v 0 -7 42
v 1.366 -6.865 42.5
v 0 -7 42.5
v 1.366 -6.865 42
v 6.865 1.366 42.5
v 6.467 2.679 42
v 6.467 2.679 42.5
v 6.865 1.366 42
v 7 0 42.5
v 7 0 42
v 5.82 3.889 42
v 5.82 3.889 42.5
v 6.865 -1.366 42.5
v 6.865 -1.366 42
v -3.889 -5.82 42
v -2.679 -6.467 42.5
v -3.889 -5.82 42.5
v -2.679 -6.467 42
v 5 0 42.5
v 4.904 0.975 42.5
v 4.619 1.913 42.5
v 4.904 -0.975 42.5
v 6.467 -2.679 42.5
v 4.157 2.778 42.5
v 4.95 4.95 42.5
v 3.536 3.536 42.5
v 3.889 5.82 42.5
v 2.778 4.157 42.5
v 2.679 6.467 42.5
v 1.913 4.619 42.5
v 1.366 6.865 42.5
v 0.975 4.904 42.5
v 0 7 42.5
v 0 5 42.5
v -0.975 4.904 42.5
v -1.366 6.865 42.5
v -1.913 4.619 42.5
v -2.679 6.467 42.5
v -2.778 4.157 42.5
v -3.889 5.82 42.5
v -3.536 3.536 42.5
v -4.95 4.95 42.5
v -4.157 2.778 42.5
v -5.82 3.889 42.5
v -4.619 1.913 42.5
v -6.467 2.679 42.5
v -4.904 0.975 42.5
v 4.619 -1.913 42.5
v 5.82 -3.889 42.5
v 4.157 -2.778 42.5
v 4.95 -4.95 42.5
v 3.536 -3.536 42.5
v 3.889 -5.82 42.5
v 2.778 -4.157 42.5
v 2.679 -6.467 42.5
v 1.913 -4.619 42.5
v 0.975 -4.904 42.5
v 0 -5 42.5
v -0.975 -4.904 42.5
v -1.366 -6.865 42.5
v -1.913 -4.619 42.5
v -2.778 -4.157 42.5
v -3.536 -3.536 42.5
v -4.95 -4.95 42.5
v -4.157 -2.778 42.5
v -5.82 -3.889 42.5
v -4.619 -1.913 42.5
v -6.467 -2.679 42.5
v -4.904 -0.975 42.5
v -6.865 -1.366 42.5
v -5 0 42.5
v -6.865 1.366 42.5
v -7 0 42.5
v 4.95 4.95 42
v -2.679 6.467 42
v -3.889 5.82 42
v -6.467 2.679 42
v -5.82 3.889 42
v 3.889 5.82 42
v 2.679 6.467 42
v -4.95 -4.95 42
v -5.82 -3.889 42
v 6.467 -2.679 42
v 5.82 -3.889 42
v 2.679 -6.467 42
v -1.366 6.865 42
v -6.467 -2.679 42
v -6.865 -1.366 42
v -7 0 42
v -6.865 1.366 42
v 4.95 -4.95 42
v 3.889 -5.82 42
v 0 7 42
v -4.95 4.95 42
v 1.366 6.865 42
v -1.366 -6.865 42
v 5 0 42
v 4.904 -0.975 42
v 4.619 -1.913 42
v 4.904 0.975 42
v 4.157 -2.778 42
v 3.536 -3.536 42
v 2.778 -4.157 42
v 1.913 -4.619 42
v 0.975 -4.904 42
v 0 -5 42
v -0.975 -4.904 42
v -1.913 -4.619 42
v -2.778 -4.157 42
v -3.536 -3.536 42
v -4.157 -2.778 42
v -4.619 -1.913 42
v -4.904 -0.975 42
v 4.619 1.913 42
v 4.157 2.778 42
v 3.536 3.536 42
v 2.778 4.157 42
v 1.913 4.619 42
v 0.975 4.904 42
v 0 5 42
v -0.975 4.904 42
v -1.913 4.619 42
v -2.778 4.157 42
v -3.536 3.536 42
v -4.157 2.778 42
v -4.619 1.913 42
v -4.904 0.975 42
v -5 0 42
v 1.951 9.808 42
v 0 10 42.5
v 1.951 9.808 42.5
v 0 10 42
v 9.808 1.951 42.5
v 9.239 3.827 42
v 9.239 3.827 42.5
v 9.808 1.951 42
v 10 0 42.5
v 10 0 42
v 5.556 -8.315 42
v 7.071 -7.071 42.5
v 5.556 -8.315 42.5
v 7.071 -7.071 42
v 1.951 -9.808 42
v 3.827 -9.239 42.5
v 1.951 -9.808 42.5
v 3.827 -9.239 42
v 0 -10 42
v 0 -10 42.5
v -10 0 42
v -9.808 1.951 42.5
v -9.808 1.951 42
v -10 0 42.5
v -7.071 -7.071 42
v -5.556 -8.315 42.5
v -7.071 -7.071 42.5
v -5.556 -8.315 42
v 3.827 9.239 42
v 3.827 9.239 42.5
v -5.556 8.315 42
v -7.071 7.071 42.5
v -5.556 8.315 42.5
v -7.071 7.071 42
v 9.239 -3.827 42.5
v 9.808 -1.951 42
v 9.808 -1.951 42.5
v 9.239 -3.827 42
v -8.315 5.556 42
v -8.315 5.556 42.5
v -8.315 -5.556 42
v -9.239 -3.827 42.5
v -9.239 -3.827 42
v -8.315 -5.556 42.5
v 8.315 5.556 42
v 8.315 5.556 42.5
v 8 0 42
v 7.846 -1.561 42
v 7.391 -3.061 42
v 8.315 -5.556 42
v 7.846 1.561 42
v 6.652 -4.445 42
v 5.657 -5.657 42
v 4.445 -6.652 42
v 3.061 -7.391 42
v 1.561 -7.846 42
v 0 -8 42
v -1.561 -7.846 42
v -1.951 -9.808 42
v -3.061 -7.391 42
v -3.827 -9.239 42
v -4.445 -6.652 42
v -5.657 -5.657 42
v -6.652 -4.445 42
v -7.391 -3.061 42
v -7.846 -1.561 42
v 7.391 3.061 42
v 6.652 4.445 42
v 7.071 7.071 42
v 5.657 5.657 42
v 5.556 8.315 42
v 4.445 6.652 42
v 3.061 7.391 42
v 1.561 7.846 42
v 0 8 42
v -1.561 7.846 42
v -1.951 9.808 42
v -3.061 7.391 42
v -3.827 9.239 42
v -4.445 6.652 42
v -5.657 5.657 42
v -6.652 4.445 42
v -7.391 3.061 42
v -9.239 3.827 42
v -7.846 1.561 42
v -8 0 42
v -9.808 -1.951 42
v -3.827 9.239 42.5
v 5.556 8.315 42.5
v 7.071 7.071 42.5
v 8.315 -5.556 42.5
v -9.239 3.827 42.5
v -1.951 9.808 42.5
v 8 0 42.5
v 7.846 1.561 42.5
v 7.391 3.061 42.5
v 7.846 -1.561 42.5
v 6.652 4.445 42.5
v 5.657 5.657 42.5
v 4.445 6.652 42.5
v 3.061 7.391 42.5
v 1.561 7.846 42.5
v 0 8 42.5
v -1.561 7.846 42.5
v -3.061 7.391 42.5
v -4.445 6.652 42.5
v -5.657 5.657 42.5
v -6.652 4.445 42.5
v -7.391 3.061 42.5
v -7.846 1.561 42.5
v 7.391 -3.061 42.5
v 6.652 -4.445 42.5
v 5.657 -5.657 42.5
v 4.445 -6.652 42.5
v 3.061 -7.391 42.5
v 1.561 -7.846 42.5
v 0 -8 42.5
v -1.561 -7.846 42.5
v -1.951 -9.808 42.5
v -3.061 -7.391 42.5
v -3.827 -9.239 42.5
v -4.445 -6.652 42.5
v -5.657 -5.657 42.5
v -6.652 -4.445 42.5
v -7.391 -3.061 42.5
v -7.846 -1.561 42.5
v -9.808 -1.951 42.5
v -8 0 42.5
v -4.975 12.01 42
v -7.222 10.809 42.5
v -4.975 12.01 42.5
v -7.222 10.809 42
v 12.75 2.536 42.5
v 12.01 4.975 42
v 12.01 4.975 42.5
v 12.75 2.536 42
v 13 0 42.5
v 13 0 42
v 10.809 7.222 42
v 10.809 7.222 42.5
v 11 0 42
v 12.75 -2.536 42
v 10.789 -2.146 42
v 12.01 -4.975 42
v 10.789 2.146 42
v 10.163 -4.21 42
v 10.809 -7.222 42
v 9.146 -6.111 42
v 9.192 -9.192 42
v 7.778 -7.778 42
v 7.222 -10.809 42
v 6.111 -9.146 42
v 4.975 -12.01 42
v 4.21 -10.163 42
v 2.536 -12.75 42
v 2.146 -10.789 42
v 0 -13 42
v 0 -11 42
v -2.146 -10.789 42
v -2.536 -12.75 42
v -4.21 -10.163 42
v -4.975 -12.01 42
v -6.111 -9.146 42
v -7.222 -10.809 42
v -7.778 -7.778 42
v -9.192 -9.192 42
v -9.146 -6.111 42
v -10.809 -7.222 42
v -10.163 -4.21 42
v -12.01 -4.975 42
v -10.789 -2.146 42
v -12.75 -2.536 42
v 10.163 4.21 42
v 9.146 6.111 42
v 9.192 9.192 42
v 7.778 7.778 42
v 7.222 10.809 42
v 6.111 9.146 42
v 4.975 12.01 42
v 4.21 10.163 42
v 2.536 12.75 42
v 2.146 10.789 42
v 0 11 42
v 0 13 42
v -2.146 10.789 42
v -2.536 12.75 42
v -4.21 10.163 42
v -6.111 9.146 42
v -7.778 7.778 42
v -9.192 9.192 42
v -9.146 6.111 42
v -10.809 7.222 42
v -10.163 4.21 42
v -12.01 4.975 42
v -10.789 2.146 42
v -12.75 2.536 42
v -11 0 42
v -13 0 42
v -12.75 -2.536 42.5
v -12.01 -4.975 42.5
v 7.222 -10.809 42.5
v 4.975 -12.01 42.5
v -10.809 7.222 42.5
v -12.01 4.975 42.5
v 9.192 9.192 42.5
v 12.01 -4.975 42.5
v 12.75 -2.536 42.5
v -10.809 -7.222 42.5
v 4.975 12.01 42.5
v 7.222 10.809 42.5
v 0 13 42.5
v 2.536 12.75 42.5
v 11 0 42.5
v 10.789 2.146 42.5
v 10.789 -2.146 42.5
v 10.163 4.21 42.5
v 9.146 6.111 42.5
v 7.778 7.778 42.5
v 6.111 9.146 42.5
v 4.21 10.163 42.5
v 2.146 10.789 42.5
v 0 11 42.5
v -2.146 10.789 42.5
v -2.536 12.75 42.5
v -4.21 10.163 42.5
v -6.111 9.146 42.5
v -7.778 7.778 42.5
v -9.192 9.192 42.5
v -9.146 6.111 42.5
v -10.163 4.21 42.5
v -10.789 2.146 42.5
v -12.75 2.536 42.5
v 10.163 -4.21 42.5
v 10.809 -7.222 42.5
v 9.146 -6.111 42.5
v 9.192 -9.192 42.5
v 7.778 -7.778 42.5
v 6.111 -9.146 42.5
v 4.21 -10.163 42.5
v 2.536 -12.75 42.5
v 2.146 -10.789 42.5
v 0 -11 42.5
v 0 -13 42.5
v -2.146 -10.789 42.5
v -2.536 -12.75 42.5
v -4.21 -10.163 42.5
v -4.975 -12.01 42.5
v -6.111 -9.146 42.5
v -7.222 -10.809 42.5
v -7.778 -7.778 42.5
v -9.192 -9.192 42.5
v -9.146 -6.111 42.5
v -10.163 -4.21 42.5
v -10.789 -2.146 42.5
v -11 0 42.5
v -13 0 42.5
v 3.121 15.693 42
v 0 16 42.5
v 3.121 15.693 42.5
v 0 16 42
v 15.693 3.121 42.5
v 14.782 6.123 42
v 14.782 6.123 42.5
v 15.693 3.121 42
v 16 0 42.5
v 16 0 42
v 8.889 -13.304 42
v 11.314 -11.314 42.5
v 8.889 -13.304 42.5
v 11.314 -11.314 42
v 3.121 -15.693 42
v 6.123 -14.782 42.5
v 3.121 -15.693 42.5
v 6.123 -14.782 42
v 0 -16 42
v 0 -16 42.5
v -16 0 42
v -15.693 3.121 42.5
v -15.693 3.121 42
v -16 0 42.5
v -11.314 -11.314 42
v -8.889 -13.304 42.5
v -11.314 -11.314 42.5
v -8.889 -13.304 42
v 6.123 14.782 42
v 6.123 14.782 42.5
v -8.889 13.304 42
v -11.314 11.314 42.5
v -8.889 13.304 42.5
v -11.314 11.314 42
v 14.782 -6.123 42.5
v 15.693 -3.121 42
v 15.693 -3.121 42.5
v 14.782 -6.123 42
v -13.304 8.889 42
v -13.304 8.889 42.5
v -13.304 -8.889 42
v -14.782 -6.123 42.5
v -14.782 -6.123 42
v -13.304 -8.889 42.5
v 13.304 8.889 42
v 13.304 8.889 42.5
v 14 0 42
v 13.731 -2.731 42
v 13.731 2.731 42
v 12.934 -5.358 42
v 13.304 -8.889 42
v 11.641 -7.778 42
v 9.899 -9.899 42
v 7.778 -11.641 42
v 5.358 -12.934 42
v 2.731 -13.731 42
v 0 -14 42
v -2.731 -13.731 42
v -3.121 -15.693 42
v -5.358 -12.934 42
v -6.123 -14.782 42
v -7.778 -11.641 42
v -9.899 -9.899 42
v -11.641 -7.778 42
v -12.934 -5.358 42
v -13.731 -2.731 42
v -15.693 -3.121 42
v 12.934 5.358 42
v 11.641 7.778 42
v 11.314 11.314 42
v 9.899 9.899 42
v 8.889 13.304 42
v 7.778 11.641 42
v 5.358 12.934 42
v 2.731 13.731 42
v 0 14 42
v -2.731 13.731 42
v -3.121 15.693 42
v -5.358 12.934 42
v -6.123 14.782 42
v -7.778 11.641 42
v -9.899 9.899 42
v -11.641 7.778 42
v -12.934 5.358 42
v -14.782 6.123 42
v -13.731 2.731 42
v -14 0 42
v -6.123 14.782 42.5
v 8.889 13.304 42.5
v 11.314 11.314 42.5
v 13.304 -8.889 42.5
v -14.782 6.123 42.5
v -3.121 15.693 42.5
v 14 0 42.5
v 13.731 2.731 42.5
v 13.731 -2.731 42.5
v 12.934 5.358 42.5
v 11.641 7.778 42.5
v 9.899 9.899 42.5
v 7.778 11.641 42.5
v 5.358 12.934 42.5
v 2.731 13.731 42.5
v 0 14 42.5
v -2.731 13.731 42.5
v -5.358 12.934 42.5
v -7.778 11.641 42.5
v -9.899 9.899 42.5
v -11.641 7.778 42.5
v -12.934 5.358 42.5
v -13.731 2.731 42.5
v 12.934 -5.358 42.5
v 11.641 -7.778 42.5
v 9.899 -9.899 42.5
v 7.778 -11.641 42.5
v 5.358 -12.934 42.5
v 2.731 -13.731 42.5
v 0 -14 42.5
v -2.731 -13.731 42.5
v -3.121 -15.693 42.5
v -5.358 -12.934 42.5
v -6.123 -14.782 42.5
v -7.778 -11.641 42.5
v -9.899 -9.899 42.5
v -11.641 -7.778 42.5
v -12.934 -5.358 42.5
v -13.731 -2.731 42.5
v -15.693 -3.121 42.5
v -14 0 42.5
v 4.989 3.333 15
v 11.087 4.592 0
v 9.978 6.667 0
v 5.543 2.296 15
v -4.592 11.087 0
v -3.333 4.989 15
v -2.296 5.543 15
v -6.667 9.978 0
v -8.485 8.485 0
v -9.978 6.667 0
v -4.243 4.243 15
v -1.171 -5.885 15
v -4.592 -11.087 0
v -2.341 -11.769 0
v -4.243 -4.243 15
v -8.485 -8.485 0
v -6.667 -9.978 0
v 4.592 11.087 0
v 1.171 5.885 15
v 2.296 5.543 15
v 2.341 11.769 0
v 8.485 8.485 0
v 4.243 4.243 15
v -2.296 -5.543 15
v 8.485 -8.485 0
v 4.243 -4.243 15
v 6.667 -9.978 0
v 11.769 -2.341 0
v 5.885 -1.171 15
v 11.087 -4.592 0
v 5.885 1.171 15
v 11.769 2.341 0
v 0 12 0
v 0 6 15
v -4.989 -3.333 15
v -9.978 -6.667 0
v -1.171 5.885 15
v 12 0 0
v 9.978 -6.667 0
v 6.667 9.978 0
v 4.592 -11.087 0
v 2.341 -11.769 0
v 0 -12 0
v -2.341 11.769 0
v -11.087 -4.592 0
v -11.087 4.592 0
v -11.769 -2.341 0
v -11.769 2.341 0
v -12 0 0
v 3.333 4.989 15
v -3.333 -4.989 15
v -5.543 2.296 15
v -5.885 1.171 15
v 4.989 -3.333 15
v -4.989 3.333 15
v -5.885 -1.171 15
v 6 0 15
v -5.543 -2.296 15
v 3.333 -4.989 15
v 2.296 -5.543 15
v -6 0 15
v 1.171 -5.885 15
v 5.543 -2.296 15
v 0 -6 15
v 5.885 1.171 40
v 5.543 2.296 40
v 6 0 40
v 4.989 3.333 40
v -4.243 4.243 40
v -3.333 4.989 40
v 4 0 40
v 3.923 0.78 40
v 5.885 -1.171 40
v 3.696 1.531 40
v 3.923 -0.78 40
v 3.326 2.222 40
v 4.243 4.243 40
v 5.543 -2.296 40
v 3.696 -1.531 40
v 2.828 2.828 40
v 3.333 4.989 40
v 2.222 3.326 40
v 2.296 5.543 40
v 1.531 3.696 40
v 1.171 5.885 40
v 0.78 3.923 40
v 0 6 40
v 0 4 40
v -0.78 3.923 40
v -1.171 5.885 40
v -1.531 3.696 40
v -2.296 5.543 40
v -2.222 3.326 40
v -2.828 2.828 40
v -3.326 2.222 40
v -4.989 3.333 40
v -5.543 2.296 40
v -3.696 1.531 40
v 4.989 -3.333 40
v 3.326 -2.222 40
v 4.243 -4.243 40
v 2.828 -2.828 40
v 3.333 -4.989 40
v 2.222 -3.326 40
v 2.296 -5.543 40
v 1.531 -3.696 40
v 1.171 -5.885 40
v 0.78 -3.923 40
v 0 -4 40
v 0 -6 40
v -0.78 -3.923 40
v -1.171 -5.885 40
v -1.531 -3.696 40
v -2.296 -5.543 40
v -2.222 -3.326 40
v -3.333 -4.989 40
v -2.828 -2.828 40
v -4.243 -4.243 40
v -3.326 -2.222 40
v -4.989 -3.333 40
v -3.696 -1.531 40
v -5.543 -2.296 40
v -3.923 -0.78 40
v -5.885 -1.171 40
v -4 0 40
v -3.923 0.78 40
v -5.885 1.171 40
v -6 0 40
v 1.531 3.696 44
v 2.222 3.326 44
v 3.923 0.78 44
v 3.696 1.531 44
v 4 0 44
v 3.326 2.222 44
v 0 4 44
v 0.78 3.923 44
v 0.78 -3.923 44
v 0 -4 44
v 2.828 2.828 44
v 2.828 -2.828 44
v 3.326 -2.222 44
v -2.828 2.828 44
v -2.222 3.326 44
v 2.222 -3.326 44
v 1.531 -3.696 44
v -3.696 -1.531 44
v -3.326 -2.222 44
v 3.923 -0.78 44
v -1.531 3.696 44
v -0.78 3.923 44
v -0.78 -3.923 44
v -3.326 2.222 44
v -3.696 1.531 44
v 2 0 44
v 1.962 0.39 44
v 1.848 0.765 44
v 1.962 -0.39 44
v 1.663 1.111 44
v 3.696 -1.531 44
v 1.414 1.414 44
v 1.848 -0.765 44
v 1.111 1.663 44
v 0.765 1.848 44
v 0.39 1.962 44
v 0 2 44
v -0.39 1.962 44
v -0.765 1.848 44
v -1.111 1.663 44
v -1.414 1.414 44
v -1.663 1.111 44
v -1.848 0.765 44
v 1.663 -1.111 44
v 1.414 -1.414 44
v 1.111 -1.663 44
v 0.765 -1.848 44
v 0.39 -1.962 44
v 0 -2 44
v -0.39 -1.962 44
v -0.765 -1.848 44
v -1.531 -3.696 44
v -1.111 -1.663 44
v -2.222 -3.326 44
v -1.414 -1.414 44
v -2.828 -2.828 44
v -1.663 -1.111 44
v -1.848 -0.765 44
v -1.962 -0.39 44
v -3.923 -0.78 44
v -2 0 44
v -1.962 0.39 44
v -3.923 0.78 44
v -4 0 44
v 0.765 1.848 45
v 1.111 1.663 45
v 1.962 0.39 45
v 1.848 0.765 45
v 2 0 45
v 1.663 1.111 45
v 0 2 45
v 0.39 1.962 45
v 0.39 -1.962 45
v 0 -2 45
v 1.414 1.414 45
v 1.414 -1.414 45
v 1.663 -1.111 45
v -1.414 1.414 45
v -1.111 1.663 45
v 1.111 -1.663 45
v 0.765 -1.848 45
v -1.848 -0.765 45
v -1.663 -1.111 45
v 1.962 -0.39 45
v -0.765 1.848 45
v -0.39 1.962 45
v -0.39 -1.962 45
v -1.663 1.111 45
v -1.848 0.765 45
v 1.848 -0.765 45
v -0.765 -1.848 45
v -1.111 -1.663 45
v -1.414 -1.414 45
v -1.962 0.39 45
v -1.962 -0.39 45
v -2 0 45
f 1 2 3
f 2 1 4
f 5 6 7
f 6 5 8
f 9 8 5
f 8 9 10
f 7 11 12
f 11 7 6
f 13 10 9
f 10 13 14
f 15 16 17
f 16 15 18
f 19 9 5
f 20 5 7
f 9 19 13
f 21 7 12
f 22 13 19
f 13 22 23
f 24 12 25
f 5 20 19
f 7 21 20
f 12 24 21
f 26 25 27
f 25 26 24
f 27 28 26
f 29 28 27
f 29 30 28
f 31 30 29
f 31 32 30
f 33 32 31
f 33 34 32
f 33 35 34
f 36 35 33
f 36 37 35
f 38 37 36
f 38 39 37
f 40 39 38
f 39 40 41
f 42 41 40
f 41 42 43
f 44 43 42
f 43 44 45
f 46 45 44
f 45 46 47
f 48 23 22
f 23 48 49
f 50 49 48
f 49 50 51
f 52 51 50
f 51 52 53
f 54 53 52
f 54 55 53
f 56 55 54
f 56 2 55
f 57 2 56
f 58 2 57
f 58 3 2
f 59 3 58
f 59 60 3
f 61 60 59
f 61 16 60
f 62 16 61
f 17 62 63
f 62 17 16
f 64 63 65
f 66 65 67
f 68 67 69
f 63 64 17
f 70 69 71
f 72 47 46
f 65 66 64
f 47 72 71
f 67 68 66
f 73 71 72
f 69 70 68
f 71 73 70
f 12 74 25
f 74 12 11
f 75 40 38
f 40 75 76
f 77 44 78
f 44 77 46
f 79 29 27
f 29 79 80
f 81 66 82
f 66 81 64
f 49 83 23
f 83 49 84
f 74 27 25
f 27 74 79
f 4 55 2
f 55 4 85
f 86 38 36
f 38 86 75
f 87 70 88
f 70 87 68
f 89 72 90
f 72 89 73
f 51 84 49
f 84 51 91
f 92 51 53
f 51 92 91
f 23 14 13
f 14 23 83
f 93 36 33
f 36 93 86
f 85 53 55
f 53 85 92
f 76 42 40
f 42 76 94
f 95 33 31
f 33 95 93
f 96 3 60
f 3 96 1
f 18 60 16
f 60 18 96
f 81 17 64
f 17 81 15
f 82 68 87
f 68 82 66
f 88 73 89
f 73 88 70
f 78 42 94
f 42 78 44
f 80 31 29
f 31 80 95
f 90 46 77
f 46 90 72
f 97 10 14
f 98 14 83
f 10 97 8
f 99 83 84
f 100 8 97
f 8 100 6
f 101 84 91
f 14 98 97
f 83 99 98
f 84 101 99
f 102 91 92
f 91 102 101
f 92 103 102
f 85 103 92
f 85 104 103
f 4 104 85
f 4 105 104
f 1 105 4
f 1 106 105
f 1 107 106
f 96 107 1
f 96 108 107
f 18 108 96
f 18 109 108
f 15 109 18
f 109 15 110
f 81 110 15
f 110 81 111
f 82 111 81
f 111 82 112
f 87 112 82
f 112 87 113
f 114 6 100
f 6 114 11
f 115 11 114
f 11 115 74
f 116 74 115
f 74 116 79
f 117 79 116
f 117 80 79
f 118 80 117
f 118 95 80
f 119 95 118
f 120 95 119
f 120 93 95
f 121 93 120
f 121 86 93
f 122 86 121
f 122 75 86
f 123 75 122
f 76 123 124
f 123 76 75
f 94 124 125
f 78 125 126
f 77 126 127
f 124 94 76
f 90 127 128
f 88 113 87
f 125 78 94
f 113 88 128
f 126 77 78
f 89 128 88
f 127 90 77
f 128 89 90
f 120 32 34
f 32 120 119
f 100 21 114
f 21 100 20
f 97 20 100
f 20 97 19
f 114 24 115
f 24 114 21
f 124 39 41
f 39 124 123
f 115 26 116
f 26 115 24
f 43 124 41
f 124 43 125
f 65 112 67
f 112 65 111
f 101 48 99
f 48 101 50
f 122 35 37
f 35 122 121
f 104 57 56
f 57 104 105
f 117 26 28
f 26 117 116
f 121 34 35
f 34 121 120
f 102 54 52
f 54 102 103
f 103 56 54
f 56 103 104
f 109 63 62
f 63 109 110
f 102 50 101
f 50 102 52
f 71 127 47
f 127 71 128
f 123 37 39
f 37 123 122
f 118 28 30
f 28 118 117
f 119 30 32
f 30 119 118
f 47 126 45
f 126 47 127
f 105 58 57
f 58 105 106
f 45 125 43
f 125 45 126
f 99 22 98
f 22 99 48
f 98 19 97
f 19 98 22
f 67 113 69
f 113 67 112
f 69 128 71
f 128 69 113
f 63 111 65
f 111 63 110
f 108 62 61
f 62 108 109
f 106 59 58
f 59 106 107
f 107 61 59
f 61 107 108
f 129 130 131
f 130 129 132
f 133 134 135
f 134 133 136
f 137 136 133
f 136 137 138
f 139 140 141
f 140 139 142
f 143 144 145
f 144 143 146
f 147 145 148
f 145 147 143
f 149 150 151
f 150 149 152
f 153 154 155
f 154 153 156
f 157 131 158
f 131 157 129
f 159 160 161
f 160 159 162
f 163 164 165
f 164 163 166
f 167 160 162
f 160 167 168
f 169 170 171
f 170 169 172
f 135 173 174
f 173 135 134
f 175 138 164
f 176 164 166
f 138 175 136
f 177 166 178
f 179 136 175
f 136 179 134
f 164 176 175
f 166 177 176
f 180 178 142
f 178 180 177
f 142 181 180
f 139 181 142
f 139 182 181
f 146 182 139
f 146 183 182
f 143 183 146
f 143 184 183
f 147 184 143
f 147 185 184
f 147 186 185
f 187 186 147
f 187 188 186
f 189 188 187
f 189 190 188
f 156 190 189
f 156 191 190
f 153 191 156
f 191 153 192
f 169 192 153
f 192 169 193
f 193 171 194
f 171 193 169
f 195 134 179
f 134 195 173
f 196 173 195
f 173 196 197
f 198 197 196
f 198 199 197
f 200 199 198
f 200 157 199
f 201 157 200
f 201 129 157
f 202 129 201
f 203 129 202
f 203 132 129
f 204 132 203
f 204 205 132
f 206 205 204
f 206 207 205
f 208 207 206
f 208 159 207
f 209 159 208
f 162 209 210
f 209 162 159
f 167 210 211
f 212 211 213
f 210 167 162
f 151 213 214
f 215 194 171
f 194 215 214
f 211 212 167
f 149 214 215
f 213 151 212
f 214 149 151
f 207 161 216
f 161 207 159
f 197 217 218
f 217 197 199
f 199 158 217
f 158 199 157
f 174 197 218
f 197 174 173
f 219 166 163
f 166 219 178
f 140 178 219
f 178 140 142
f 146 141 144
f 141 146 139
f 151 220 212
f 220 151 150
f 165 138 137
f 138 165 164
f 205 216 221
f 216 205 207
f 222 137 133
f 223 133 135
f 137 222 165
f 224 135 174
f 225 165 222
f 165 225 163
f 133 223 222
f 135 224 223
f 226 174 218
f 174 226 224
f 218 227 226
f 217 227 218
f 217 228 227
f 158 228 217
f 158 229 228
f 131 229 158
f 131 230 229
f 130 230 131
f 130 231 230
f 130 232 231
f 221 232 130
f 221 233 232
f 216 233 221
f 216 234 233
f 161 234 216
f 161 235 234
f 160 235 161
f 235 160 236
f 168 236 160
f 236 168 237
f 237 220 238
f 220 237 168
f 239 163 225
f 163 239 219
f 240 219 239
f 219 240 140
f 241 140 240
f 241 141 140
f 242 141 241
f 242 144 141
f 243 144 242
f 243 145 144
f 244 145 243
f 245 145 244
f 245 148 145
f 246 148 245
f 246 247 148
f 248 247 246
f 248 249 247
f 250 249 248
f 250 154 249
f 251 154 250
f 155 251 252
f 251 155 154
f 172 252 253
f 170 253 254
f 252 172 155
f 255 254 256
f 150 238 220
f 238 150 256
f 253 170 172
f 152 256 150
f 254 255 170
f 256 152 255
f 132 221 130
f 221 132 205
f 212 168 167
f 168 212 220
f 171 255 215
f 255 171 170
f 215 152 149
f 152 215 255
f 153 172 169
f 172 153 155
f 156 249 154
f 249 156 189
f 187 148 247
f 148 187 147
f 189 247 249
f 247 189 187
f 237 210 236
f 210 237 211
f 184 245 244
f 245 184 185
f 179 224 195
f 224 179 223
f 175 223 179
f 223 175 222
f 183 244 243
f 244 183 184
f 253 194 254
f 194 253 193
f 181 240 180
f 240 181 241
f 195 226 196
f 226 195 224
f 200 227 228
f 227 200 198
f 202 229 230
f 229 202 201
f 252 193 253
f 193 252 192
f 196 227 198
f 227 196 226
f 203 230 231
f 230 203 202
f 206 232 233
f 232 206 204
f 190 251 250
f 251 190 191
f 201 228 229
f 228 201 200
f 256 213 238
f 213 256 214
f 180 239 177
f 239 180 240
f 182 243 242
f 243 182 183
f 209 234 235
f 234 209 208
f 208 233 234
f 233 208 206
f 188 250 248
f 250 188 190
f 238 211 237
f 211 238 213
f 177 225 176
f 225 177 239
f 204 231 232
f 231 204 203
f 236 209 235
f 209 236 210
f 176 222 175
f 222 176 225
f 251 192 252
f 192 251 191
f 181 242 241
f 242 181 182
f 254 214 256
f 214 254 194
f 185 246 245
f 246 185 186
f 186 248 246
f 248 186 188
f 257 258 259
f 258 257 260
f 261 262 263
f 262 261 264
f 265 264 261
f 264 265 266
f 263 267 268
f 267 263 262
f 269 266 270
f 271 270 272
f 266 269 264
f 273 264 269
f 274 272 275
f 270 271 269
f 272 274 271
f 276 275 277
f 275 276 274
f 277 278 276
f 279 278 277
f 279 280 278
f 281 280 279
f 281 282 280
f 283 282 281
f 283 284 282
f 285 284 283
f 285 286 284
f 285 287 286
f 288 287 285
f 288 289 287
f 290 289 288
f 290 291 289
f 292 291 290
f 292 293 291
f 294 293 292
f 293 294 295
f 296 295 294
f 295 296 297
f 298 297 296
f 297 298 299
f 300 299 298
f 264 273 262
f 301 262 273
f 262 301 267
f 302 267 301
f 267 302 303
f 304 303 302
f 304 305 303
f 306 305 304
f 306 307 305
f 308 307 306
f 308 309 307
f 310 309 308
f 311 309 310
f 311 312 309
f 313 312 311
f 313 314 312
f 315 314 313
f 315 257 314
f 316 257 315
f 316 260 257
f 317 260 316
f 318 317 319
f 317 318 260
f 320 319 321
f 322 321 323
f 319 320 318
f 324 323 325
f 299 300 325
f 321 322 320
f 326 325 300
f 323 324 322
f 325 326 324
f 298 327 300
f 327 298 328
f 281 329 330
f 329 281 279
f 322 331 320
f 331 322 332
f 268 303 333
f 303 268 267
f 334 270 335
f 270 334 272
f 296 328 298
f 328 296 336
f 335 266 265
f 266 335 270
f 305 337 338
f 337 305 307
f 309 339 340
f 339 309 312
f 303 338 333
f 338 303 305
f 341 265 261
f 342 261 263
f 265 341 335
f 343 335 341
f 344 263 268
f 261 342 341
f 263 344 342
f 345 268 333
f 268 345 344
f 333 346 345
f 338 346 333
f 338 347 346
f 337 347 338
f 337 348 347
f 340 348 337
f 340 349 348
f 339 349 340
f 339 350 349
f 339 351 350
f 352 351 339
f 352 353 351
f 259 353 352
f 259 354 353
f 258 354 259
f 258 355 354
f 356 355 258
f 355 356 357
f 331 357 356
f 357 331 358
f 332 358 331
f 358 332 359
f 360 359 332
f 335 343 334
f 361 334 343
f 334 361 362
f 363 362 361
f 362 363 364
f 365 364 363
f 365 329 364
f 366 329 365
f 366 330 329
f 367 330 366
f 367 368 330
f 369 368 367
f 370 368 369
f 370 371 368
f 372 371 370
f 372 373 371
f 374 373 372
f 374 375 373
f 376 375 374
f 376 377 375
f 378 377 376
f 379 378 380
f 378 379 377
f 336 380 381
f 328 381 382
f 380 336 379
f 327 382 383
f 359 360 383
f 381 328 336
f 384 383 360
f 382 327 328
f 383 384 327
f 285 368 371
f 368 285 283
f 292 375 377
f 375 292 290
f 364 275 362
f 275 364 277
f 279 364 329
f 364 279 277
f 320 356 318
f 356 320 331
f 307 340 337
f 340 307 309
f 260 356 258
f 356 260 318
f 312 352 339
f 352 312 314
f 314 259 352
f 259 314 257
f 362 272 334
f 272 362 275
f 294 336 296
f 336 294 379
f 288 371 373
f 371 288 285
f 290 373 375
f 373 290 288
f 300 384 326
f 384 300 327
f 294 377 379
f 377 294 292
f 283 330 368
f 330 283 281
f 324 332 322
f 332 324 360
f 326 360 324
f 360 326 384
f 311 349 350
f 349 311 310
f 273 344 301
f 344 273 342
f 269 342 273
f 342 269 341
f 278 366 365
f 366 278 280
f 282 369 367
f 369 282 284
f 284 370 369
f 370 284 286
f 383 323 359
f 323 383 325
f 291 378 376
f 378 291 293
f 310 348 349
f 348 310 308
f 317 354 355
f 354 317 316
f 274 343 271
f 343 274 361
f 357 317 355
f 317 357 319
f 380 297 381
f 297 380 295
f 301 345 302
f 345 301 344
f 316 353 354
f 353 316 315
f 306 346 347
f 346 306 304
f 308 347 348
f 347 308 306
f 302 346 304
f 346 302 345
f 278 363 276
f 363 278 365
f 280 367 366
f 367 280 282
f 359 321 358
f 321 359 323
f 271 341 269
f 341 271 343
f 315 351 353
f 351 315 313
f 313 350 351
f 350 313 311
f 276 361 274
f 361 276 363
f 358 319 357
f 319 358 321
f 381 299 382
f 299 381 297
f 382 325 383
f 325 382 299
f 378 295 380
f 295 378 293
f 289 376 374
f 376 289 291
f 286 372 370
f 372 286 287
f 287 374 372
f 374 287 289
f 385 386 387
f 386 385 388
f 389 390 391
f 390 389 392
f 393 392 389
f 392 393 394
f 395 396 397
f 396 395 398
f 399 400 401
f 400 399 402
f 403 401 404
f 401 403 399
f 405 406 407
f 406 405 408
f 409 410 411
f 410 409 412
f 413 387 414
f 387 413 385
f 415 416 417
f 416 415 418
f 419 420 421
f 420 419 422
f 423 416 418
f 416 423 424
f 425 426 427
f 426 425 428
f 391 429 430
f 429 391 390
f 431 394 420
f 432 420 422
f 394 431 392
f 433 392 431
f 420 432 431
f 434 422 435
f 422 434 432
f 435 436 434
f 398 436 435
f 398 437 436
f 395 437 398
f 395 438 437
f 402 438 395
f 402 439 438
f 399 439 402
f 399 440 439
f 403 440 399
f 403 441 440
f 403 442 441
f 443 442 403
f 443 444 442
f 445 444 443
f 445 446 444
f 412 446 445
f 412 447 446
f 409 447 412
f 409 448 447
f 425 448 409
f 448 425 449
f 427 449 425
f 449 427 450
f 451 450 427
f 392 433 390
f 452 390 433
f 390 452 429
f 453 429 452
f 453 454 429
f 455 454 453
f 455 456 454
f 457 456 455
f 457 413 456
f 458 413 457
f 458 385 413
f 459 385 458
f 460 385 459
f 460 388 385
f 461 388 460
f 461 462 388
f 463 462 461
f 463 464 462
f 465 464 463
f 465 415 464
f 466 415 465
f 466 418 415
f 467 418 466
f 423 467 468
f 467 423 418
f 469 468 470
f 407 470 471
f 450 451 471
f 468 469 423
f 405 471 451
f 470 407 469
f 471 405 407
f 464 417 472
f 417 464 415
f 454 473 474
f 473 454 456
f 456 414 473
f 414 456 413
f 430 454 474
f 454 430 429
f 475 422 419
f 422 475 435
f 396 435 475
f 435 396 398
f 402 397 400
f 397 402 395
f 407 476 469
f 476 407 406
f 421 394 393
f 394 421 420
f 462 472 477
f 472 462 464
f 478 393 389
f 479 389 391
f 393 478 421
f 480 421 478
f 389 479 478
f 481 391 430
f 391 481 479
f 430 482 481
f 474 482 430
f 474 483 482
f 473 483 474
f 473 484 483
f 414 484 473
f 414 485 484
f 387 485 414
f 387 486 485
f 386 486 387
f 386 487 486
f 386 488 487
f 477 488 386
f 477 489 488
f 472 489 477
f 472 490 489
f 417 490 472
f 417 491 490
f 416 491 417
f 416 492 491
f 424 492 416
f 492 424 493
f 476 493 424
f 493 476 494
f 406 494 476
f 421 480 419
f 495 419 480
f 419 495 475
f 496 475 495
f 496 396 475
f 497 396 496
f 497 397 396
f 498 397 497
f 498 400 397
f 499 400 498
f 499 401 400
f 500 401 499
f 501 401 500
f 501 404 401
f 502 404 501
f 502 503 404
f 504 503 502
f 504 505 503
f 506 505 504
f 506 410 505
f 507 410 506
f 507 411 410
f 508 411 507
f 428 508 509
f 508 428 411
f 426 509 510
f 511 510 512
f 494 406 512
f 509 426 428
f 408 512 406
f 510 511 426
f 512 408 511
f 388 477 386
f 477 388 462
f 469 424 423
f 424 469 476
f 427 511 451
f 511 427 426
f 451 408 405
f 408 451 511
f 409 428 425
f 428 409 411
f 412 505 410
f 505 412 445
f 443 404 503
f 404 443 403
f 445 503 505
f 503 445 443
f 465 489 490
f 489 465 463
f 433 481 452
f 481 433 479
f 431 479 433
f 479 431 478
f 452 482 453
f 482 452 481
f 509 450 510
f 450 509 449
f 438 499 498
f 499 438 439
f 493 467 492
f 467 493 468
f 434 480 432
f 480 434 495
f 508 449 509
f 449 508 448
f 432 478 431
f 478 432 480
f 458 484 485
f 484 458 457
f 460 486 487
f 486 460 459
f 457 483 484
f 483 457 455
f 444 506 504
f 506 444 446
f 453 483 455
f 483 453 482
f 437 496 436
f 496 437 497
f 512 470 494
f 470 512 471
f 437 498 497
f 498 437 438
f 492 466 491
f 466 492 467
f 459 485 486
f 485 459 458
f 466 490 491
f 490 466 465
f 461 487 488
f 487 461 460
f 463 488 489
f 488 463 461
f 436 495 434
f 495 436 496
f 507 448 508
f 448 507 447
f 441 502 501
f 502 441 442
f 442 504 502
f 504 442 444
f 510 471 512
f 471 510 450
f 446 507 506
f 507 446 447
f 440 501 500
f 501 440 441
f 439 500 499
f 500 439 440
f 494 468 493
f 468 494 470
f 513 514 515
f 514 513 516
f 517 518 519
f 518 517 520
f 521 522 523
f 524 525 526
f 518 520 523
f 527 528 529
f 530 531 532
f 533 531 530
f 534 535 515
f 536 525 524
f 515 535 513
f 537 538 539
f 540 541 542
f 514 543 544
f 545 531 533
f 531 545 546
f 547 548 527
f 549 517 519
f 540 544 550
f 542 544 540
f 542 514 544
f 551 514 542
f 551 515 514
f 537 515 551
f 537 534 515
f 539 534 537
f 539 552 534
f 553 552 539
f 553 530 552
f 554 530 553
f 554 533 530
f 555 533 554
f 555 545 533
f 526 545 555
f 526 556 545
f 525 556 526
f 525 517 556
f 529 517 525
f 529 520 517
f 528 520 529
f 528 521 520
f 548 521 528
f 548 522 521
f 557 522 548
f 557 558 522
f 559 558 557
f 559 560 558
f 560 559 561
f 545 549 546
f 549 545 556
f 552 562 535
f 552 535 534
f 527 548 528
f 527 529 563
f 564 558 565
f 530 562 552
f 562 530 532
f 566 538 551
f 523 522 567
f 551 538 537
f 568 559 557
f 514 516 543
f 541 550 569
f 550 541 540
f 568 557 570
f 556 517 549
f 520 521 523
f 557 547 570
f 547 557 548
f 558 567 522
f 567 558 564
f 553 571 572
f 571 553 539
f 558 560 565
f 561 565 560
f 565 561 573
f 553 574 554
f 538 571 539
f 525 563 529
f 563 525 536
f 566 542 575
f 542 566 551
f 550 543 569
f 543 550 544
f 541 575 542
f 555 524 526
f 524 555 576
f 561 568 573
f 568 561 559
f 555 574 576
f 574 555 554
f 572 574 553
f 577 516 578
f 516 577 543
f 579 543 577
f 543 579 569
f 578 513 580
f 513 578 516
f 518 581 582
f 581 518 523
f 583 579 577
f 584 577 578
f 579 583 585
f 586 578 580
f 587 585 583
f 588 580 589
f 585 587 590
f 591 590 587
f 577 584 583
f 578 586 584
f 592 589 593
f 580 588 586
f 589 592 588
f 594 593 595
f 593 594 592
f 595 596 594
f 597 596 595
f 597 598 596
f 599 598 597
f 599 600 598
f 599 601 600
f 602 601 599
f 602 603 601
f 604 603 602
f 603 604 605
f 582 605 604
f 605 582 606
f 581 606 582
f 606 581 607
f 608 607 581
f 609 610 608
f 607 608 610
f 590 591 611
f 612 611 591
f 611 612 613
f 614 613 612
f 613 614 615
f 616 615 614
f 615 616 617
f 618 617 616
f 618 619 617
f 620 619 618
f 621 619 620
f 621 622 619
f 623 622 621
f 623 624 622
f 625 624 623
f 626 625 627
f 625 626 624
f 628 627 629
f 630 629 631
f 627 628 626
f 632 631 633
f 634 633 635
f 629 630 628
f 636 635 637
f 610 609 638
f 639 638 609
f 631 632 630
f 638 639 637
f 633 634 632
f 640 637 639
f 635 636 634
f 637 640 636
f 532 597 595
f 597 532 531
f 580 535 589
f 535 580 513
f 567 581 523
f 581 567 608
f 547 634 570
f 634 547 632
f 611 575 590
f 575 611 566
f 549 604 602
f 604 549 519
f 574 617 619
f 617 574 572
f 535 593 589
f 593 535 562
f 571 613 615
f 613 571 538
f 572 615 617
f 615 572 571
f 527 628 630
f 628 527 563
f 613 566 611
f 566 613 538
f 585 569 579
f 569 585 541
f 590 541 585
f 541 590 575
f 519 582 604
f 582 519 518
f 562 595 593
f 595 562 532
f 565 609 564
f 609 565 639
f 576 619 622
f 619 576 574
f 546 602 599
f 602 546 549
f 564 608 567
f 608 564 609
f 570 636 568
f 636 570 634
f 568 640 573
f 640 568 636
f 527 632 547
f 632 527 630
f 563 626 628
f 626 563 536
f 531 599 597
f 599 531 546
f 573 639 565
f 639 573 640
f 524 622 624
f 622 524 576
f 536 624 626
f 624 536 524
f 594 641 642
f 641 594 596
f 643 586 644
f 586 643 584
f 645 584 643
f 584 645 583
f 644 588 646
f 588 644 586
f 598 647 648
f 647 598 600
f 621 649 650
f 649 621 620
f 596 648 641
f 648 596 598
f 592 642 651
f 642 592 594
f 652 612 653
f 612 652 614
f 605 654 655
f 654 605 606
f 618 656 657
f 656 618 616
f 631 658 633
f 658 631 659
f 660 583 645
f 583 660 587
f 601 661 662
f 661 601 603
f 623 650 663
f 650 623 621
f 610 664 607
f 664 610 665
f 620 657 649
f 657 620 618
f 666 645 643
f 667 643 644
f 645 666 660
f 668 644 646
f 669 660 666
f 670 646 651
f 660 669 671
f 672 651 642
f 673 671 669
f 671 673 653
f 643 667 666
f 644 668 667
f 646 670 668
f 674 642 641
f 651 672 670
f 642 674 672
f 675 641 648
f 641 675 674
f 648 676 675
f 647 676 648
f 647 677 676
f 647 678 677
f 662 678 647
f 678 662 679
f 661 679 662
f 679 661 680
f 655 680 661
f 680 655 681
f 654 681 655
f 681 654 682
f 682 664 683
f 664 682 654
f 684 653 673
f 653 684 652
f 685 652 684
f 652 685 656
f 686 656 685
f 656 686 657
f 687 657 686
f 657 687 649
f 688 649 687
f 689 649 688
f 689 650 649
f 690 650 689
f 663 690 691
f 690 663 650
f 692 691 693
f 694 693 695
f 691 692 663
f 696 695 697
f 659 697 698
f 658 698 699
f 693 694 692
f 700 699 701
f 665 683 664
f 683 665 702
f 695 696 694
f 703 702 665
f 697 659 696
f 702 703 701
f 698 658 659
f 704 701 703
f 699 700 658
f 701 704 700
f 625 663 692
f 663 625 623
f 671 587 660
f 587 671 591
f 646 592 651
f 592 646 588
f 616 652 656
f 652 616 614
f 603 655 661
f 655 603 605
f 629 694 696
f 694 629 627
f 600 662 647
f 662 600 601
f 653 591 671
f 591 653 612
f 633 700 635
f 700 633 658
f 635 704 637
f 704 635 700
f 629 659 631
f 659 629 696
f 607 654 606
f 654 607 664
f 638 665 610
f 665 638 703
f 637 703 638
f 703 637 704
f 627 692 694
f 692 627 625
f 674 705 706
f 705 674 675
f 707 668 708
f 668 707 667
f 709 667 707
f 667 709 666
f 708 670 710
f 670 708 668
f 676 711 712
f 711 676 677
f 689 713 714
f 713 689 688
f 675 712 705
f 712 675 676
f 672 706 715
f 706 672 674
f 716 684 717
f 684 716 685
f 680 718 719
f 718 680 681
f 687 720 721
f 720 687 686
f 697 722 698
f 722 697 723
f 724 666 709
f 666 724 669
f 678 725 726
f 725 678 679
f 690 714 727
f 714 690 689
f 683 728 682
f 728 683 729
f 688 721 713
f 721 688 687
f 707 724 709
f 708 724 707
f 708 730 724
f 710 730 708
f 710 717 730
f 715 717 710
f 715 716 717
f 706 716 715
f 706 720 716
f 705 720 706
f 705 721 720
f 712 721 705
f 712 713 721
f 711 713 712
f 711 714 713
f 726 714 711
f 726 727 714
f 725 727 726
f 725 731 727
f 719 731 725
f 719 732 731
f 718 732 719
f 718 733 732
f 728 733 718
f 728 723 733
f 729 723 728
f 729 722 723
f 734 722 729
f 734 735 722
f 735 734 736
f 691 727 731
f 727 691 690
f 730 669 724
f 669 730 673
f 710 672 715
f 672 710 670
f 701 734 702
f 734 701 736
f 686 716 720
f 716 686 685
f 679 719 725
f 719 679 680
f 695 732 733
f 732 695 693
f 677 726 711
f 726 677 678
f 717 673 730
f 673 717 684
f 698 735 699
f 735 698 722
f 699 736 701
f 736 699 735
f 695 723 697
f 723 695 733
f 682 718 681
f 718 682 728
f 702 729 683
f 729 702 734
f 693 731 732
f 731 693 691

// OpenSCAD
$fn=32;

module lighthouse_tower() {
    // Tapered concrete base frustum
    color("#555555") {
        cylinder(r1=12, r2=6, h=15);
    }

    // Main cylindrical tower shaft
    color("#777777") {
        translate([0, 0, 15])
        cylinder(r=6, h=25);
    }

    // Glass lantern room at top of tower
    color("#f0f0f0") {
        translate([0, 0, 40])
        cylinder(r=4, h=4);
    }

    // Small central lantern lens cap
    color("white") {
        translate([0, 0, 44])
        cylinder(r=2, h=1);
    }

    // 4 concentric radar rings radiating from lantern height
    color("#4488ff") {
        for(ring_index = [0:3]) {
            // Calculate increasing radii for each concentric ring
            inner_rad = 5 + (3 * ring_index);
            outer_rad = 7 + (3 * ring_index);
            
            // Thin flat ring at lantern midpoint height
            translate([0, 0, 42])
            difference() {
                cylinder(r=outer_rad, h=0.5);
                cylinder(r=inner_rad, h=0.5);
            }
        }
    }
}

// Call the module to render
lighthouse_tower();
